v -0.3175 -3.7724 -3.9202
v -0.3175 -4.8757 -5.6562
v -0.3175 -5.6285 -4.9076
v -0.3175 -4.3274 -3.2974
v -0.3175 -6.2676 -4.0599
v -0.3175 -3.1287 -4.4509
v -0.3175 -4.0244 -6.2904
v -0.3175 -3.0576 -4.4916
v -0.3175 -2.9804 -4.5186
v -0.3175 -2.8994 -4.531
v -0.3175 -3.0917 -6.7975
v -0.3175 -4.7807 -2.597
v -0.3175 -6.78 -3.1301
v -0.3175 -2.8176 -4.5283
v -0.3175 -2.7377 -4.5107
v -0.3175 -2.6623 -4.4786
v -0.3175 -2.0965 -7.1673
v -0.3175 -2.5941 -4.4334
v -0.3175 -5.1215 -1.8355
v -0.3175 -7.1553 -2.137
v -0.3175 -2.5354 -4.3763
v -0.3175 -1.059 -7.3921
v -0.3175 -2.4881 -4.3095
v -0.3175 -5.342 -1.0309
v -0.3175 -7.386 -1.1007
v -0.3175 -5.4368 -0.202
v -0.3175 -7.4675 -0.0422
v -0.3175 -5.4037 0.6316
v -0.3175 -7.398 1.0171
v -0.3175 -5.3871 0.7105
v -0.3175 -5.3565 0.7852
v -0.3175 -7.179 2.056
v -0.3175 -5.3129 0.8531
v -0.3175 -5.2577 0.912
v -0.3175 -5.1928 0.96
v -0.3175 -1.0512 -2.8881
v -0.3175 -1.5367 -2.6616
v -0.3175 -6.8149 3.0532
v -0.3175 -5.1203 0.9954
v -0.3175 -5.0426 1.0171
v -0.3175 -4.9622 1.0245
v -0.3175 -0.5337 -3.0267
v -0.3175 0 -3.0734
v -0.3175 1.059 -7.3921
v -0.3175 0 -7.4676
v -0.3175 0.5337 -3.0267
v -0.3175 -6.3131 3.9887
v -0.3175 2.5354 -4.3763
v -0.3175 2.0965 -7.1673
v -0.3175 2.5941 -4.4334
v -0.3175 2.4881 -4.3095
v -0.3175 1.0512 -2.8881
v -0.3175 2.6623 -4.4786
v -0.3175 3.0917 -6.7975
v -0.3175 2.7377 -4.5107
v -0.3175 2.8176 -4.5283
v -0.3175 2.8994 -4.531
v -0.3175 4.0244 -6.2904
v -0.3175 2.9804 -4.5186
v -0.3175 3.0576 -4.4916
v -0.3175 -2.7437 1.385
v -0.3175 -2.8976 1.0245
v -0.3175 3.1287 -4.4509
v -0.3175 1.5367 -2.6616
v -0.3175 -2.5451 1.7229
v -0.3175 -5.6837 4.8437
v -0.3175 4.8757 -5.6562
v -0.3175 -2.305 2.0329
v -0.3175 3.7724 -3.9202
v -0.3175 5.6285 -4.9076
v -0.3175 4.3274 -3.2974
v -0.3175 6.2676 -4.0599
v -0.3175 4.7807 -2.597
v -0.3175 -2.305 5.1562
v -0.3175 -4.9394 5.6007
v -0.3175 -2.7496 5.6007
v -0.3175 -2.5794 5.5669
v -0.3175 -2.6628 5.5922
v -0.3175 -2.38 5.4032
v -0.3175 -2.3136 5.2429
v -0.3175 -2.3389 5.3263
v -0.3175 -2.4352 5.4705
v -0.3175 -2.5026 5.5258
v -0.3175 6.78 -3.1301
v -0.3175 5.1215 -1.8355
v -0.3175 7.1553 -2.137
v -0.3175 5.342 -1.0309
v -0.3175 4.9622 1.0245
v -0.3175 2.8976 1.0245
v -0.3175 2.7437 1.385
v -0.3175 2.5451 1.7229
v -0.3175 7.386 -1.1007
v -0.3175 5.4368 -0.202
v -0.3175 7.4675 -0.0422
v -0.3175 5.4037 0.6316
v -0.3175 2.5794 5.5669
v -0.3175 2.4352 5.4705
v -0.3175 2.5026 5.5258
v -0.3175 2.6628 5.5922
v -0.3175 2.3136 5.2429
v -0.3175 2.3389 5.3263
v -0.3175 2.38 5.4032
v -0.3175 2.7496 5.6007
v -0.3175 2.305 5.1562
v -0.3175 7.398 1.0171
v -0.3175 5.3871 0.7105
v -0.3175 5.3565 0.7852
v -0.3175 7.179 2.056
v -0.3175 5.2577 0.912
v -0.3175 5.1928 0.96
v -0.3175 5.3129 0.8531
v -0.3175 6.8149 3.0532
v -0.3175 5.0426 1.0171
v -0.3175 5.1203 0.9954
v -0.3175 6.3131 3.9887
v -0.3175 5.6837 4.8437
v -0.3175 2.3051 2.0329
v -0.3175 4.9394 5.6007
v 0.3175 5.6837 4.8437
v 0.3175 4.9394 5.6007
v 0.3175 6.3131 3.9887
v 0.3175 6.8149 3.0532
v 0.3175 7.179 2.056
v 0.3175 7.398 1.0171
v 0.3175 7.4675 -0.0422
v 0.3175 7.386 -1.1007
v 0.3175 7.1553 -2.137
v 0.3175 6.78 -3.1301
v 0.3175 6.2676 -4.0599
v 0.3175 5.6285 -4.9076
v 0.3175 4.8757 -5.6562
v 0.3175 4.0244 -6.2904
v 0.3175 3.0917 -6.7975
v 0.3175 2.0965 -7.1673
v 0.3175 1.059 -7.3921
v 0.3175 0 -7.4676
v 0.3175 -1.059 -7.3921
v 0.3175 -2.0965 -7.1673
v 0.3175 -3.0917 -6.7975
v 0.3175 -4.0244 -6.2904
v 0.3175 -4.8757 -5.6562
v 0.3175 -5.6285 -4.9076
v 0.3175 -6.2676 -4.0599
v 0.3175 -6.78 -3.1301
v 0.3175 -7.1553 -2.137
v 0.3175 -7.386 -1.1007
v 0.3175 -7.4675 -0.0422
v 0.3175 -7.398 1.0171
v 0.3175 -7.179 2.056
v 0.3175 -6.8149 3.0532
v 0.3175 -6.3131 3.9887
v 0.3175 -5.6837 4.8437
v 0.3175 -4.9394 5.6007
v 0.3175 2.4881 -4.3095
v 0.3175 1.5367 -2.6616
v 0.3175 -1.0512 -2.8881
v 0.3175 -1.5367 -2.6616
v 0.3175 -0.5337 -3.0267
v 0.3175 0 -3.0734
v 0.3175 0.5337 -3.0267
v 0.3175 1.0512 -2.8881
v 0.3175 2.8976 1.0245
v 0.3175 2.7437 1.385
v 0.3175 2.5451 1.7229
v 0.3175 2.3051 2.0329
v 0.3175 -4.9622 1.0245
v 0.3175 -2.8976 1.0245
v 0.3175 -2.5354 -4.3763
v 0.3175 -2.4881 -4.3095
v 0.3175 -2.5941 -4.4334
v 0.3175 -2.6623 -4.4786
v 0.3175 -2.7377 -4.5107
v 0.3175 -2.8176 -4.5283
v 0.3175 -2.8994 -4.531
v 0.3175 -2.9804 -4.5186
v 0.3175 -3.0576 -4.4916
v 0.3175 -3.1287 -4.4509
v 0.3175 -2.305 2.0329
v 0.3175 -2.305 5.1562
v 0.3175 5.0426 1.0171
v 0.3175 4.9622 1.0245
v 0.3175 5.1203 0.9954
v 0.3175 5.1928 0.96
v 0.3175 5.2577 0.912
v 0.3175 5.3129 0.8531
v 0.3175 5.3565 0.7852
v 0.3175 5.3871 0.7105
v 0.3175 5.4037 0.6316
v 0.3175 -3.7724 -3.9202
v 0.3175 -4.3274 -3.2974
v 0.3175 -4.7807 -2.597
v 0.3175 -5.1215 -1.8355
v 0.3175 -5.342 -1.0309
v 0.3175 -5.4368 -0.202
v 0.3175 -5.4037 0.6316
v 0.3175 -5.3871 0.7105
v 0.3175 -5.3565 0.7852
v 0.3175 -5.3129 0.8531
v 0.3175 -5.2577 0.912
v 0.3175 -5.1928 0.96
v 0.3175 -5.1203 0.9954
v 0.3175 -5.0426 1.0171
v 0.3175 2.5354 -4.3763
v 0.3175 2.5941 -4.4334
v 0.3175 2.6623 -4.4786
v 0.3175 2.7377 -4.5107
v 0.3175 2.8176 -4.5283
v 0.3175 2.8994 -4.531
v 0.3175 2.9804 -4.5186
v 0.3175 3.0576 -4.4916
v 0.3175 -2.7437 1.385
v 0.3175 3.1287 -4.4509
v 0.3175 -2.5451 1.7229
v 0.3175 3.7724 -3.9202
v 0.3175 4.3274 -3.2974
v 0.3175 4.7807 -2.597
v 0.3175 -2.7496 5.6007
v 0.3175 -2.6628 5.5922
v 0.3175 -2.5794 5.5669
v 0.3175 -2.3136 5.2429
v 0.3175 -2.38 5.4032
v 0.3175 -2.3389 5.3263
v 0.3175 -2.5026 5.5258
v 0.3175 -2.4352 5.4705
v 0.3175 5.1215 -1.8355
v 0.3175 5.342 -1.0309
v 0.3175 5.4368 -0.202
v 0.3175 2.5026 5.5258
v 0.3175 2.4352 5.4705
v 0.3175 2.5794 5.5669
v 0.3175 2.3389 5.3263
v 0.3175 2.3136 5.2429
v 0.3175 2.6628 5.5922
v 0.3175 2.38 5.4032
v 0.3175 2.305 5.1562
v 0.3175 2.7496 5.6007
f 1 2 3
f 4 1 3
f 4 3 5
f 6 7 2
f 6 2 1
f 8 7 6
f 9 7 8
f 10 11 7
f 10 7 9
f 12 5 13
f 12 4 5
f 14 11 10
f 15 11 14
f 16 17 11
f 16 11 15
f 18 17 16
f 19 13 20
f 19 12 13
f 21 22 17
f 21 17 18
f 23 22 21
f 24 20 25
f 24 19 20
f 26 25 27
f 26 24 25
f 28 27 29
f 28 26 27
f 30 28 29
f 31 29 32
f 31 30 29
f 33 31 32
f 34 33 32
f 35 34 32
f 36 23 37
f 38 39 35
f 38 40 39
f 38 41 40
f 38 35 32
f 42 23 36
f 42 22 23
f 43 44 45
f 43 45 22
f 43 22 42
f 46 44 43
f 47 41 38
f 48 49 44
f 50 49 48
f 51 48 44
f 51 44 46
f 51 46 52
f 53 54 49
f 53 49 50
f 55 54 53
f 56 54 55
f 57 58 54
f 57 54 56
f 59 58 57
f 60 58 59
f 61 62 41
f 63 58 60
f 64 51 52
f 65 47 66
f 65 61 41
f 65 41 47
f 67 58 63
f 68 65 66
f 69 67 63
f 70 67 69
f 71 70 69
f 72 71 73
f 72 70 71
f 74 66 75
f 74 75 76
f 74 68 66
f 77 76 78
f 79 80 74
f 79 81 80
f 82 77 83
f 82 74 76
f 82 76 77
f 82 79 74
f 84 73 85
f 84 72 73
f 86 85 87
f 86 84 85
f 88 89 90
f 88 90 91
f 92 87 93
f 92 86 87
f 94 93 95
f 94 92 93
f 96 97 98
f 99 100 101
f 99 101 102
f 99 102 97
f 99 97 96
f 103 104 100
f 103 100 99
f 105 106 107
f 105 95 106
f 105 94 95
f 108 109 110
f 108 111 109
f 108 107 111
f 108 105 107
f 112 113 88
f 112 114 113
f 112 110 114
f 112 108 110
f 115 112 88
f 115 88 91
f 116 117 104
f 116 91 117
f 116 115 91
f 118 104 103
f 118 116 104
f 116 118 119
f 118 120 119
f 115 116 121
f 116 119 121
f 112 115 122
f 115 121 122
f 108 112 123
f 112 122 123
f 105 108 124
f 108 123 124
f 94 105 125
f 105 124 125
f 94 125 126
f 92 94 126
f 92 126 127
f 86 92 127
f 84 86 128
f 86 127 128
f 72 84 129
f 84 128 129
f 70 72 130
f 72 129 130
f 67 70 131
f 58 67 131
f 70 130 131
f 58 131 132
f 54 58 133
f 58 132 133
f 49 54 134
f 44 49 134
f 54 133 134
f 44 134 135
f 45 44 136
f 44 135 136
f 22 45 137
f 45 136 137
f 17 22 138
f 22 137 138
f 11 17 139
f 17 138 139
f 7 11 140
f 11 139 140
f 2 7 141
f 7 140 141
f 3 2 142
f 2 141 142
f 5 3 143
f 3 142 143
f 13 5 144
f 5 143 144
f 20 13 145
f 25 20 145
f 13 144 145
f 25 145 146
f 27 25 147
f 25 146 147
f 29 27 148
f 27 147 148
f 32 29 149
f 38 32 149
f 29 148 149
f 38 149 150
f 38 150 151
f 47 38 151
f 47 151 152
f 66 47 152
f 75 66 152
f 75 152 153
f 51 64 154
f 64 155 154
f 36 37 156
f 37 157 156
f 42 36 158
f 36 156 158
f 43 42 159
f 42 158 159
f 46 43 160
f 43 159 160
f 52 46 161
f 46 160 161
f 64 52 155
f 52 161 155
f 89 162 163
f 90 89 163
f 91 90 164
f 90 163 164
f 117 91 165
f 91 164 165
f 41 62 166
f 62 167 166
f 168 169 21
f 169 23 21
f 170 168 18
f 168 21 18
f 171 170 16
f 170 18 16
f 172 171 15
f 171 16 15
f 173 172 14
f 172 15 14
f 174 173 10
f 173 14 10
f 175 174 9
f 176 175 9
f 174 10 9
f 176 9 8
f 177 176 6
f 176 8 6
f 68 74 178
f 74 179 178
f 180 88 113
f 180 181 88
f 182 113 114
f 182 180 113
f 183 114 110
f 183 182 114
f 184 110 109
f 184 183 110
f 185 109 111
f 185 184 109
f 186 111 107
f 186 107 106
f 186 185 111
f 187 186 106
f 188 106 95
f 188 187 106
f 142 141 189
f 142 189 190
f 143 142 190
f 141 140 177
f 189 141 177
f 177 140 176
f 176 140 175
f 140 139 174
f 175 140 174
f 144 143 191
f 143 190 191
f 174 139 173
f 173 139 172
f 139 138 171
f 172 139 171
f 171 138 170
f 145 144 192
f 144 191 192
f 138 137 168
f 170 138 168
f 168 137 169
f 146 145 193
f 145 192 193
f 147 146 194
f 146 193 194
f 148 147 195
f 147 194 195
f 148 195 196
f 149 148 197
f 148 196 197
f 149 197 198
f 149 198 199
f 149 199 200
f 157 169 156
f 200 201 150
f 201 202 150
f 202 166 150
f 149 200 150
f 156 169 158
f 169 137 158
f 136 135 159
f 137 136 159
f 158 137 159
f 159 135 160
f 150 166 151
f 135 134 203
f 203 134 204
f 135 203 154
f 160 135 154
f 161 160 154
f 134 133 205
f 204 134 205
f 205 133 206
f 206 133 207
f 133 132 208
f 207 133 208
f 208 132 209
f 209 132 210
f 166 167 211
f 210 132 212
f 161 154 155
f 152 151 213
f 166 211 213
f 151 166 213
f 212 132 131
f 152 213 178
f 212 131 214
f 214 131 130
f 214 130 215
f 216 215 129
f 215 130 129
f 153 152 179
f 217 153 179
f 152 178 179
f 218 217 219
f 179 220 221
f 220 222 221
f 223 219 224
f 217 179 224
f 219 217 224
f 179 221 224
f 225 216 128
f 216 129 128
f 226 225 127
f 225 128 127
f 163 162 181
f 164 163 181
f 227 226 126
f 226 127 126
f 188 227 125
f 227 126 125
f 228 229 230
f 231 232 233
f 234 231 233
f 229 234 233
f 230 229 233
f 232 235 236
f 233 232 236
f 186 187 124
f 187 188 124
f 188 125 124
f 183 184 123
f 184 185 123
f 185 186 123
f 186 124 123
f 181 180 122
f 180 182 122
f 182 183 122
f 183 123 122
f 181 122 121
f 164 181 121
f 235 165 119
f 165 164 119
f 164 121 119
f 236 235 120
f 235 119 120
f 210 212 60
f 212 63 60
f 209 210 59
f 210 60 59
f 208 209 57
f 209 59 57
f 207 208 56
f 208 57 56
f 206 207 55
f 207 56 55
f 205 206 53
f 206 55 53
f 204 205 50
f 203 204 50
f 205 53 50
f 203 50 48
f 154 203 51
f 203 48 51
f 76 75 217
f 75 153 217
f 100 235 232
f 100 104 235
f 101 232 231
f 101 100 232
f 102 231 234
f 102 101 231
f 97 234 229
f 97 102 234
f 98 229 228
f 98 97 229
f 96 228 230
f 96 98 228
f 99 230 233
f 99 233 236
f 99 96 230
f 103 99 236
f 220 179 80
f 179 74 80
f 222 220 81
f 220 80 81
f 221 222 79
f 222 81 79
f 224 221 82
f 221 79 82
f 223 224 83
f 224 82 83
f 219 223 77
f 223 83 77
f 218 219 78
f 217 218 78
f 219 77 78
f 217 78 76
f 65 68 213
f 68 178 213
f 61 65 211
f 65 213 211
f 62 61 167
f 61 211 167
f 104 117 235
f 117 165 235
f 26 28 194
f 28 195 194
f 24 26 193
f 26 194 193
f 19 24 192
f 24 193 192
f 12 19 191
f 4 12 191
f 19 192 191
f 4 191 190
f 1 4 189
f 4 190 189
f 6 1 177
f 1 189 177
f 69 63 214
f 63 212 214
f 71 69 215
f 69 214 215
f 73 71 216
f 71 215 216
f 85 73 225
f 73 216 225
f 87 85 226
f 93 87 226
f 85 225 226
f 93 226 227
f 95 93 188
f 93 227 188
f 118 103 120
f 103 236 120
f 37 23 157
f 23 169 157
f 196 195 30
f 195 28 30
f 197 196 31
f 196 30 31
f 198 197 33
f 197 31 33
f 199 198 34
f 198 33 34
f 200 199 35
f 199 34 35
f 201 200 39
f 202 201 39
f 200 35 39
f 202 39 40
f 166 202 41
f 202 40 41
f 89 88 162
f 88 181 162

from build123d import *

# Parameters (mm, degrees)
EXTRUDE1_DEPTH = 0.3175
FILLET1_R      = 0.4445


with BuildPart() as part:
    # Sketch1 → Extrude1 (new body, symmetric)
    with BuildSketch(Plane(origin=(0, 0, 0), x_dir=(0, 0, -1), z_dir=(1, 0, 0))):
        with BuildLine():
            Line((-2.03286302, 2.30505), (-5.6007, 2.30505))
            Line((-5.6007, 2.30505), (-5.6007, 4.939353123))
            ThreePointArc((-5.6007, 4.939353123), (7.4676, 0), (-5.6007, -4.939353123))
            Line((-5.6007, -4.939353123), (-5.6007, -2.30505))
            Line((-5.6007, -2.30505), (-2.03286302, -2.30505))
            ThreePointArc((-2.03286302, -2.30505), (-1.557113921, -2.649751648), (-1.024466667, -2.897629308))
            Line((-1.024466667, -2.897629308), (-1.024466667, -5.343190414))
            ThreePointArc((-1.024466667, -5.343190414), (2.262460607, -4.947776041), (4.711625177, -2.720258065))
            Line((4.711625177, -2.720258065), (2.661642476, -1.5367))
            ThreePointArc((2.661642476, -1.5367), (3.0734, 0), (2.661642476, 1.5367))
            Line((2.661642476, 1.5367), (4.711625177, 2.720258065))
            ThreePointArc((4.711625177, 2.720258065), (2.262460607, 4.947776041), (-1.024466667, 5.343190414))
            Line((-1.024466667, 5.343190414), (-1.024466667, 2.897629308))
            ThreePointArc((-1.024466667, 2.897629308), (-1.557113921, 2.649751648), (-2.03286302, 2.30505))
        make_face()
    extrude(amount=EXTRUDE1_DEPTH, both=True)

    # Fillet1
    fillet1_edges = [part.edges().sort_by_distance(p)[0] for p in [
        (0, -2.30505, 5.6007),
        (0, -5.343190414, 1.024466667),
        (0, -2.720258065, -4.711625177),
        (0, 2.720258065, -4.711625177),
        (0, 5.343190414, 1.024466667),
        (0, 2.30505, 5.6007),
    ]]
    fillet(fillet1_edges, radius=FILLET1_R)


solid = part.part
